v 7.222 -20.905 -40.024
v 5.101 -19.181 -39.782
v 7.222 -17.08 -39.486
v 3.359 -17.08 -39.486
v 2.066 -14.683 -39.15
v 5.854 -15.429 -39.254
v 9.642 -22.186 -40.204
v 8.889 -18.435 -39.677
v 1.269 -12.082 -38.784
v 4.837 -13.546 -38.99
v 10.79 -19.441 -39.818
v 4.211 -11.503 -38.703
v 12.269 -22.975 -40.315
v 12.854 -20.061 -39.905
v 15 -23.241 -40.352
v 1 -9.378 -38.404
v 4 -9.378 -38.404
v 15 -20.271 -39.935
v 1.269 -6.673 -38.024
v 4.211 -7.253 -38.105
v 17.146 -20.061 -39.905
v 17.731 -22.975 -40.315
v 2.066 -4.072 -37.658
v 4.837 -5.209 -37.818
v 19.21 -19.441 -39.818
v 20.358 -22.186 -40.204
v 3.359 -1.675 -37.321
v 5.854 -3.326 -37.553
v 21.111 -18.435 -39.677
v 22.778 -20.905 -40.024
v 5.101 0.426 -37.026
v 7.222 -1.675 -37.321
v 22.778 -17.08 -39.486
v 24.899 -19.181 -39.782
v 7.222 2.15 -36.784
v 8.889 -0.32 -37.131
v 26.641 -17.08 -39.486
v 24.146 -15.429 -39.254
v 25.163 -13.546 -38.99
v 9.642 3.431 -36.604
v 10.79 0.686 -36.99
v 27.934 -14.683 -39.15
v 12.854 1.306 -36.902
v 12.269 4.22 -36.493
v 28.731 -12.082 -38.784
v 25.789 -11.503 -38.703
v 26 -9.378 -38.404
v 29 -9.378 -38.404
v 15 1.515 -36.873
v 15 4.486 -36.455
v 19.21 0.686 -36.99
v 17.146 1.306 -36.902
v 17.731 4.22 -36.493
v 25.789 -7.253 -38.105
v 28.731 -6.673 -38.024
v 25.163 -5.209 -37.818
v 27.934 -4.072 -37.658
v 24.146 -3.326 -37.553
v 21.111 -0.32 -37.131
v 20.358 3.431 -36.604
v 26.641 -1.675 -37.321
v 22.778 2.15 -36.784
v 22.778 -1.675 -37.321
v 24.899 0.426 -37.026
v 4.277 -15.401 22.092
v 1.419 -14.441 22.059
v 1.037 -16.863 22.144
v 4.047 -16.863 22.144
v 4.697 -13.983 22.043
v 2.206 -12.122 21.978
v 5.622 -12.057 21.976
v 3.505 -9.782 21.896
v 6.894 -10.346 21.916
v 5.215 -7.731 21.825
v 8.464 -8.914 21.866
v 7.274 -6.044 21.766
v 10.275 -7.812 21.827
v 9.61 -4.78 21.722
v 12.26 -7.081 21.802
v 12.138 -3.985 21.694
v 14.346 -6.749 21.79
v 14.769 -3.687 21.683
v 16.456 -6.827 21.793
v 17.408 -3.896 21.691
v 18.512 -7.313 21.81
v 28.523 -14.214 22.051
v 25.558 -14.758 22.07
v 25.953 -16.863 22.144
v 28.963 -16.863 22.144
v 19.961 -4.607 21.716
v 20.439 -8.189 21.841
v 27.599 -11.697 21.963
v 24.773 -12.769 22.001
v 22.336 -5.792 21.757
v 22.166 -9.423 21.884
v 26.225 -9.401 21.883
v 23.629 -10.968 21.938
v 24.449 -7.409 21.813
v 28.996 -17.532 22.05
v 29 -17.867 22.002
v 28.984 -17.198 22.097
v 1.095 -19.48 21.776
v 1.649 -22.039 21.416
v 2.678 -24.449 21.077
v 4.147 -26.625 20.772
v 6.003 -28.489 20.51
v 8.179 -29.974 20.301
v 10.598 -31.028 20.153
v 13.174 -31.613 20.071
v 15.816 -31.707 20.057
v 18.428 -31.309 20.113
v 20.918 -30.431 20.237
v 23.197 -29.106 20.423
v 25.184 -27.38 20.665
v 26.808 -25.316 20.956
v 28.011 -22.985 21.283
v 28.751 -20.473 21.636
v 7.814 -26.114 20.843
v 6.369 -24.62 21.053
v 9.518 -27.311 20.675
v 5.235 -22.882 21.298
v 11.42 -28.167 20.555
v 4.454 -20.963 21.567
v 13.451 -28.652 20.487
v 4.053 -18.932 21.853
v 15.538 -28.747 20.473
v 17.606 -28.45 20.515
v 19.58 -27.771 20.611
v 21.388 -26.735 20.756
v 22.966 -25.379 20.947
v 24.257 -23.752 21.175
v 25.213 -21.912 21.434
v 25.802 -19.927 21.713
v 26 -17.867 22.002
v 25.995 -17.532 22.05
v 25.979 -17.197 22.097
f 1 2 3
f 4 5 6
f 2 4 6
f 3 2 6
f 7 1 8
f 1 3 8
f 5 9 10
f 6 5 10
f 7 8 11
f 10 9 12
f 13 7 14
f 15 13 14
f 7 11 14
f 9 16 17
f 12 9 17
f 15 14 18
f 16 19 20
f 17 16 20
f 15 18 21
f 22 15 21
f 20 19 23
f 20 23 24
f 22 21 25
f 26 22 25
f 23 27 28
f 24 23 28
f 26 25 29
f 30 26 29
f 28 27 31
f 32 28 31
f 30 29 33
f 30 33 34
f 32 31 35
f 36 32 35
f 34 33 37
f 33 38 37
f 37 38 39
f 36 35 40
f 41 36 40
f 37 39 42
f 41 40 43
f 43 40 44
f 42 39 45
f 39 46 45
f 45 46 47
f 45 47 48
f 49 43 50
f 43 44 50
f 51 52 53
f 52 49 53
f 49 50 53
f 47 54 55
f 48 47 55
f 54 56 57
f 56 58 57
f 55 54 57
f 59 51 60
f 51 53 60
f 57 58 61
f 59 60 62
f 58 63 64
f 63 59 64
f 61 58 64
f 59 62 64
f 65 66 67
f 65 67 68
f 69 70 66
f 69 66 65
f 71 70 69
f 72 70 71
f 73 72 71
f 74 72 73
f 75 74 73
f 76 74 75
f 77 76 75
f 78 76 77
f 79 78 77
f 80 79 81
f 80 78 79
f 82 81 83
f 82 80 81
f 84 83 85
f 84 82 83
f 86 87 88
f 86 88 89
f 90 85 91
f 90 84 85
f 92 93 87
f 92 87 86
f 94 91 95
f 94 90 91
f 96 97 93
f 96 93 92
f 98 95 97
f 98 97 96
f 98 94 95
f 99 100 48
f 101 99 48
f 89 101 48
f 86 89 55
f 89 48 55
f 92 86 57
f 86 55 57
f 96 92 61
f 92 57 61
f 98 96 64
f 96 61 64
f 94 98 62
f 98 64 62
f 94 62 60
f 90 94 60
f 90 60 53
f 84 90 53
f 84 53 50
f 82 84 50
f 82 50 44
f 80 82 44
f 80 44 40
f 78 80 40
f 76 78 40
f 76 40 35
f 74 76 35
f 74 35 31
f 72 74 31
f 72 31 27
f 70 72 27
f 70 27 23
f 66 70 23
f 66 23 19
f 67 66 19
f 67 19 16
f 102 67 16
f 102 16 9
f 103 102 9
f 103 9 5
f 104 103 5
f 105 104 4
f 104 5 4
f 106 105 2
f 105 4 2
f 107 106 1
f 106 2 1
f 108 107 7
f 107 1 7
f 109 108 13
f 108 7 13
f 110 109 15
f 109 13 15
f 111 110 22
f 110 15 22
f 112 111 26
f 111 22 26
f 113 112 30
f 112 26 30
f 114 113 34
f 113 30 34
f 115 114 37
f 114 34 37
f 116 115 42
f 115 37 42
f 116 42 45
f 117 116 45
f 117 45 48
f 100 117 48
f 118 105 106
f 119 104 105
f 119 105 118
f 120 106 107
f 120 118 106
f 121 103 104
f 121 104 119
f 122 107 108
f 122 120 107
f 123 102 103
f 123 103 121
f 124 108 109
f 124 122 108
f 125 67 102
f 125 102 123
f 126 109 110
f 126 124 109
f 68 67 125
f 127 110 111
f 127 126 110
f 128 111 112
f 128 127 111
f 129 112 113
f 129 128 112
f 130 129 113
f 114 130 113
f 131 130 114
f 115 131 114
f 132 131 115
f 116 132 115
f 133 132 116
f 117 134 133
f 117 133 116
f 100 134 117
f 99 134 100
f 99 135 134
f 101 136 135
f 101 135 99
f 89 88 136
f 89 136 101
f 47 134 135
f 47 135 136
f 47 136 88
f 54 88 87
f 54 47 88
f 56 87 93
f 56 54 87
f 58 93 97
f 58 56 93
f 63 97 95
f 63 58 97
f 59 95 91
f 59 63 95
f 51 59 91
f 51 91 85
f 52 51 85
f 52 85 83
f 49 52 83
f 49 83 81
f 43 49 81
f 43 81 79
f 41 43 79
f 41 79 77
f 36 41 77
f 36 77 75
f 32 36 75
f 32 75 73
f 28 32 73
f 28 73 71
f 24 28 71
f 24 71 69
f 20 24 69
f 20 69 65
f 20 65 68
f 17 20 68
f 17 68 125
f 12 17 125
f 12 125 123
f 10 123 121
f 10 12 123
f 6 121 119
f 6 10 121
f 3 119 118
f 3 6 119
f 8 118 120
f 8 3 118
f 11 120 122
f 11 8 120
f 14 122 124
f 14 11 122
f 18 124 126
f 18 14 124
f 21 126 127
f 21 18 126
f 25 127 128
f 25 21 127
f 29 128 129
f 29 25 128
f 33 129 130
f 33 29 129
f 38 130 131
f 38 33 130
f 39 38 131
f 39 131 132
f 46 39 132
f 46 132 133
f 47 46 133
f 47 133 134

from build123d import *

# Parameters (mm, degrees)
CYLINDER009_R          = 11
CYLINDER009_DEPTH      = 61
BOX020_W               = 32
BOX020_H               = 32
BOX020_DEPTH           = 8
BOX020_PLACEMENT_ANGLE = 10
CYLINDER008_R          = 14
CYLINDER008_DEPTH      = 61
CUT014_PLACEMENT_ANGLE = 8


with BuildPart() as tubepunch:
    # Cylinder009 → Cylinder009 (new body)
    with BuildSketch(Plane(origin=(15, -20, -39), x_dir=(1, 0, 0), z_dir=(0, 0, 1))):
        Circle(CYLINDER009_R)
    extrude(amount=CYLINDER009_DEPTH)


with BuildPart() as fusion010:
    # Box020 → Box020 (new body)
    with BuildSketch(Plane.XY):
        with Locations((16, 16)):
            Rectangle(BOX020_W, BOX020_H)
    extrude(amount=BOX020_DEPTH)


with BuildPart() as fusion010_1:
    # Box020 placement: moved
    add(fusion010.part.moved(Location((-2, -36, 25))).rotate(Axis((-2, -36, 25), (-1, 0, 0)), BOX020_PLACEMENT_ANGLE))

    # Fusion010: union TubePunch
    add(tubepunch.part)


with BuildPart() as tube:
    # Cylinder008 → Cylinder008 (new body)
    with BuildSketch(Plane(origin=(15, -20, -39), x_dir=(1, 0, 0), z_dir=(0, 0, 1))):
        Circle(CYLINDER008_R)
    extrude(amount=CYLINDER008_DEPTH)

    # Cut014: cut Fusion010
    add(fusion010_1.part, mode=Mode.SUBTRACT)


with BuildPart() as tube_1:
    # Cut014 placement: moved
    add(tube.part.moved(Location((0, 5, 3))).rotate(Axis((0, 5, 3), (1, 0, 0)), CUT014_PLACEMENT_ANGLE))


solid = tube_1.part
